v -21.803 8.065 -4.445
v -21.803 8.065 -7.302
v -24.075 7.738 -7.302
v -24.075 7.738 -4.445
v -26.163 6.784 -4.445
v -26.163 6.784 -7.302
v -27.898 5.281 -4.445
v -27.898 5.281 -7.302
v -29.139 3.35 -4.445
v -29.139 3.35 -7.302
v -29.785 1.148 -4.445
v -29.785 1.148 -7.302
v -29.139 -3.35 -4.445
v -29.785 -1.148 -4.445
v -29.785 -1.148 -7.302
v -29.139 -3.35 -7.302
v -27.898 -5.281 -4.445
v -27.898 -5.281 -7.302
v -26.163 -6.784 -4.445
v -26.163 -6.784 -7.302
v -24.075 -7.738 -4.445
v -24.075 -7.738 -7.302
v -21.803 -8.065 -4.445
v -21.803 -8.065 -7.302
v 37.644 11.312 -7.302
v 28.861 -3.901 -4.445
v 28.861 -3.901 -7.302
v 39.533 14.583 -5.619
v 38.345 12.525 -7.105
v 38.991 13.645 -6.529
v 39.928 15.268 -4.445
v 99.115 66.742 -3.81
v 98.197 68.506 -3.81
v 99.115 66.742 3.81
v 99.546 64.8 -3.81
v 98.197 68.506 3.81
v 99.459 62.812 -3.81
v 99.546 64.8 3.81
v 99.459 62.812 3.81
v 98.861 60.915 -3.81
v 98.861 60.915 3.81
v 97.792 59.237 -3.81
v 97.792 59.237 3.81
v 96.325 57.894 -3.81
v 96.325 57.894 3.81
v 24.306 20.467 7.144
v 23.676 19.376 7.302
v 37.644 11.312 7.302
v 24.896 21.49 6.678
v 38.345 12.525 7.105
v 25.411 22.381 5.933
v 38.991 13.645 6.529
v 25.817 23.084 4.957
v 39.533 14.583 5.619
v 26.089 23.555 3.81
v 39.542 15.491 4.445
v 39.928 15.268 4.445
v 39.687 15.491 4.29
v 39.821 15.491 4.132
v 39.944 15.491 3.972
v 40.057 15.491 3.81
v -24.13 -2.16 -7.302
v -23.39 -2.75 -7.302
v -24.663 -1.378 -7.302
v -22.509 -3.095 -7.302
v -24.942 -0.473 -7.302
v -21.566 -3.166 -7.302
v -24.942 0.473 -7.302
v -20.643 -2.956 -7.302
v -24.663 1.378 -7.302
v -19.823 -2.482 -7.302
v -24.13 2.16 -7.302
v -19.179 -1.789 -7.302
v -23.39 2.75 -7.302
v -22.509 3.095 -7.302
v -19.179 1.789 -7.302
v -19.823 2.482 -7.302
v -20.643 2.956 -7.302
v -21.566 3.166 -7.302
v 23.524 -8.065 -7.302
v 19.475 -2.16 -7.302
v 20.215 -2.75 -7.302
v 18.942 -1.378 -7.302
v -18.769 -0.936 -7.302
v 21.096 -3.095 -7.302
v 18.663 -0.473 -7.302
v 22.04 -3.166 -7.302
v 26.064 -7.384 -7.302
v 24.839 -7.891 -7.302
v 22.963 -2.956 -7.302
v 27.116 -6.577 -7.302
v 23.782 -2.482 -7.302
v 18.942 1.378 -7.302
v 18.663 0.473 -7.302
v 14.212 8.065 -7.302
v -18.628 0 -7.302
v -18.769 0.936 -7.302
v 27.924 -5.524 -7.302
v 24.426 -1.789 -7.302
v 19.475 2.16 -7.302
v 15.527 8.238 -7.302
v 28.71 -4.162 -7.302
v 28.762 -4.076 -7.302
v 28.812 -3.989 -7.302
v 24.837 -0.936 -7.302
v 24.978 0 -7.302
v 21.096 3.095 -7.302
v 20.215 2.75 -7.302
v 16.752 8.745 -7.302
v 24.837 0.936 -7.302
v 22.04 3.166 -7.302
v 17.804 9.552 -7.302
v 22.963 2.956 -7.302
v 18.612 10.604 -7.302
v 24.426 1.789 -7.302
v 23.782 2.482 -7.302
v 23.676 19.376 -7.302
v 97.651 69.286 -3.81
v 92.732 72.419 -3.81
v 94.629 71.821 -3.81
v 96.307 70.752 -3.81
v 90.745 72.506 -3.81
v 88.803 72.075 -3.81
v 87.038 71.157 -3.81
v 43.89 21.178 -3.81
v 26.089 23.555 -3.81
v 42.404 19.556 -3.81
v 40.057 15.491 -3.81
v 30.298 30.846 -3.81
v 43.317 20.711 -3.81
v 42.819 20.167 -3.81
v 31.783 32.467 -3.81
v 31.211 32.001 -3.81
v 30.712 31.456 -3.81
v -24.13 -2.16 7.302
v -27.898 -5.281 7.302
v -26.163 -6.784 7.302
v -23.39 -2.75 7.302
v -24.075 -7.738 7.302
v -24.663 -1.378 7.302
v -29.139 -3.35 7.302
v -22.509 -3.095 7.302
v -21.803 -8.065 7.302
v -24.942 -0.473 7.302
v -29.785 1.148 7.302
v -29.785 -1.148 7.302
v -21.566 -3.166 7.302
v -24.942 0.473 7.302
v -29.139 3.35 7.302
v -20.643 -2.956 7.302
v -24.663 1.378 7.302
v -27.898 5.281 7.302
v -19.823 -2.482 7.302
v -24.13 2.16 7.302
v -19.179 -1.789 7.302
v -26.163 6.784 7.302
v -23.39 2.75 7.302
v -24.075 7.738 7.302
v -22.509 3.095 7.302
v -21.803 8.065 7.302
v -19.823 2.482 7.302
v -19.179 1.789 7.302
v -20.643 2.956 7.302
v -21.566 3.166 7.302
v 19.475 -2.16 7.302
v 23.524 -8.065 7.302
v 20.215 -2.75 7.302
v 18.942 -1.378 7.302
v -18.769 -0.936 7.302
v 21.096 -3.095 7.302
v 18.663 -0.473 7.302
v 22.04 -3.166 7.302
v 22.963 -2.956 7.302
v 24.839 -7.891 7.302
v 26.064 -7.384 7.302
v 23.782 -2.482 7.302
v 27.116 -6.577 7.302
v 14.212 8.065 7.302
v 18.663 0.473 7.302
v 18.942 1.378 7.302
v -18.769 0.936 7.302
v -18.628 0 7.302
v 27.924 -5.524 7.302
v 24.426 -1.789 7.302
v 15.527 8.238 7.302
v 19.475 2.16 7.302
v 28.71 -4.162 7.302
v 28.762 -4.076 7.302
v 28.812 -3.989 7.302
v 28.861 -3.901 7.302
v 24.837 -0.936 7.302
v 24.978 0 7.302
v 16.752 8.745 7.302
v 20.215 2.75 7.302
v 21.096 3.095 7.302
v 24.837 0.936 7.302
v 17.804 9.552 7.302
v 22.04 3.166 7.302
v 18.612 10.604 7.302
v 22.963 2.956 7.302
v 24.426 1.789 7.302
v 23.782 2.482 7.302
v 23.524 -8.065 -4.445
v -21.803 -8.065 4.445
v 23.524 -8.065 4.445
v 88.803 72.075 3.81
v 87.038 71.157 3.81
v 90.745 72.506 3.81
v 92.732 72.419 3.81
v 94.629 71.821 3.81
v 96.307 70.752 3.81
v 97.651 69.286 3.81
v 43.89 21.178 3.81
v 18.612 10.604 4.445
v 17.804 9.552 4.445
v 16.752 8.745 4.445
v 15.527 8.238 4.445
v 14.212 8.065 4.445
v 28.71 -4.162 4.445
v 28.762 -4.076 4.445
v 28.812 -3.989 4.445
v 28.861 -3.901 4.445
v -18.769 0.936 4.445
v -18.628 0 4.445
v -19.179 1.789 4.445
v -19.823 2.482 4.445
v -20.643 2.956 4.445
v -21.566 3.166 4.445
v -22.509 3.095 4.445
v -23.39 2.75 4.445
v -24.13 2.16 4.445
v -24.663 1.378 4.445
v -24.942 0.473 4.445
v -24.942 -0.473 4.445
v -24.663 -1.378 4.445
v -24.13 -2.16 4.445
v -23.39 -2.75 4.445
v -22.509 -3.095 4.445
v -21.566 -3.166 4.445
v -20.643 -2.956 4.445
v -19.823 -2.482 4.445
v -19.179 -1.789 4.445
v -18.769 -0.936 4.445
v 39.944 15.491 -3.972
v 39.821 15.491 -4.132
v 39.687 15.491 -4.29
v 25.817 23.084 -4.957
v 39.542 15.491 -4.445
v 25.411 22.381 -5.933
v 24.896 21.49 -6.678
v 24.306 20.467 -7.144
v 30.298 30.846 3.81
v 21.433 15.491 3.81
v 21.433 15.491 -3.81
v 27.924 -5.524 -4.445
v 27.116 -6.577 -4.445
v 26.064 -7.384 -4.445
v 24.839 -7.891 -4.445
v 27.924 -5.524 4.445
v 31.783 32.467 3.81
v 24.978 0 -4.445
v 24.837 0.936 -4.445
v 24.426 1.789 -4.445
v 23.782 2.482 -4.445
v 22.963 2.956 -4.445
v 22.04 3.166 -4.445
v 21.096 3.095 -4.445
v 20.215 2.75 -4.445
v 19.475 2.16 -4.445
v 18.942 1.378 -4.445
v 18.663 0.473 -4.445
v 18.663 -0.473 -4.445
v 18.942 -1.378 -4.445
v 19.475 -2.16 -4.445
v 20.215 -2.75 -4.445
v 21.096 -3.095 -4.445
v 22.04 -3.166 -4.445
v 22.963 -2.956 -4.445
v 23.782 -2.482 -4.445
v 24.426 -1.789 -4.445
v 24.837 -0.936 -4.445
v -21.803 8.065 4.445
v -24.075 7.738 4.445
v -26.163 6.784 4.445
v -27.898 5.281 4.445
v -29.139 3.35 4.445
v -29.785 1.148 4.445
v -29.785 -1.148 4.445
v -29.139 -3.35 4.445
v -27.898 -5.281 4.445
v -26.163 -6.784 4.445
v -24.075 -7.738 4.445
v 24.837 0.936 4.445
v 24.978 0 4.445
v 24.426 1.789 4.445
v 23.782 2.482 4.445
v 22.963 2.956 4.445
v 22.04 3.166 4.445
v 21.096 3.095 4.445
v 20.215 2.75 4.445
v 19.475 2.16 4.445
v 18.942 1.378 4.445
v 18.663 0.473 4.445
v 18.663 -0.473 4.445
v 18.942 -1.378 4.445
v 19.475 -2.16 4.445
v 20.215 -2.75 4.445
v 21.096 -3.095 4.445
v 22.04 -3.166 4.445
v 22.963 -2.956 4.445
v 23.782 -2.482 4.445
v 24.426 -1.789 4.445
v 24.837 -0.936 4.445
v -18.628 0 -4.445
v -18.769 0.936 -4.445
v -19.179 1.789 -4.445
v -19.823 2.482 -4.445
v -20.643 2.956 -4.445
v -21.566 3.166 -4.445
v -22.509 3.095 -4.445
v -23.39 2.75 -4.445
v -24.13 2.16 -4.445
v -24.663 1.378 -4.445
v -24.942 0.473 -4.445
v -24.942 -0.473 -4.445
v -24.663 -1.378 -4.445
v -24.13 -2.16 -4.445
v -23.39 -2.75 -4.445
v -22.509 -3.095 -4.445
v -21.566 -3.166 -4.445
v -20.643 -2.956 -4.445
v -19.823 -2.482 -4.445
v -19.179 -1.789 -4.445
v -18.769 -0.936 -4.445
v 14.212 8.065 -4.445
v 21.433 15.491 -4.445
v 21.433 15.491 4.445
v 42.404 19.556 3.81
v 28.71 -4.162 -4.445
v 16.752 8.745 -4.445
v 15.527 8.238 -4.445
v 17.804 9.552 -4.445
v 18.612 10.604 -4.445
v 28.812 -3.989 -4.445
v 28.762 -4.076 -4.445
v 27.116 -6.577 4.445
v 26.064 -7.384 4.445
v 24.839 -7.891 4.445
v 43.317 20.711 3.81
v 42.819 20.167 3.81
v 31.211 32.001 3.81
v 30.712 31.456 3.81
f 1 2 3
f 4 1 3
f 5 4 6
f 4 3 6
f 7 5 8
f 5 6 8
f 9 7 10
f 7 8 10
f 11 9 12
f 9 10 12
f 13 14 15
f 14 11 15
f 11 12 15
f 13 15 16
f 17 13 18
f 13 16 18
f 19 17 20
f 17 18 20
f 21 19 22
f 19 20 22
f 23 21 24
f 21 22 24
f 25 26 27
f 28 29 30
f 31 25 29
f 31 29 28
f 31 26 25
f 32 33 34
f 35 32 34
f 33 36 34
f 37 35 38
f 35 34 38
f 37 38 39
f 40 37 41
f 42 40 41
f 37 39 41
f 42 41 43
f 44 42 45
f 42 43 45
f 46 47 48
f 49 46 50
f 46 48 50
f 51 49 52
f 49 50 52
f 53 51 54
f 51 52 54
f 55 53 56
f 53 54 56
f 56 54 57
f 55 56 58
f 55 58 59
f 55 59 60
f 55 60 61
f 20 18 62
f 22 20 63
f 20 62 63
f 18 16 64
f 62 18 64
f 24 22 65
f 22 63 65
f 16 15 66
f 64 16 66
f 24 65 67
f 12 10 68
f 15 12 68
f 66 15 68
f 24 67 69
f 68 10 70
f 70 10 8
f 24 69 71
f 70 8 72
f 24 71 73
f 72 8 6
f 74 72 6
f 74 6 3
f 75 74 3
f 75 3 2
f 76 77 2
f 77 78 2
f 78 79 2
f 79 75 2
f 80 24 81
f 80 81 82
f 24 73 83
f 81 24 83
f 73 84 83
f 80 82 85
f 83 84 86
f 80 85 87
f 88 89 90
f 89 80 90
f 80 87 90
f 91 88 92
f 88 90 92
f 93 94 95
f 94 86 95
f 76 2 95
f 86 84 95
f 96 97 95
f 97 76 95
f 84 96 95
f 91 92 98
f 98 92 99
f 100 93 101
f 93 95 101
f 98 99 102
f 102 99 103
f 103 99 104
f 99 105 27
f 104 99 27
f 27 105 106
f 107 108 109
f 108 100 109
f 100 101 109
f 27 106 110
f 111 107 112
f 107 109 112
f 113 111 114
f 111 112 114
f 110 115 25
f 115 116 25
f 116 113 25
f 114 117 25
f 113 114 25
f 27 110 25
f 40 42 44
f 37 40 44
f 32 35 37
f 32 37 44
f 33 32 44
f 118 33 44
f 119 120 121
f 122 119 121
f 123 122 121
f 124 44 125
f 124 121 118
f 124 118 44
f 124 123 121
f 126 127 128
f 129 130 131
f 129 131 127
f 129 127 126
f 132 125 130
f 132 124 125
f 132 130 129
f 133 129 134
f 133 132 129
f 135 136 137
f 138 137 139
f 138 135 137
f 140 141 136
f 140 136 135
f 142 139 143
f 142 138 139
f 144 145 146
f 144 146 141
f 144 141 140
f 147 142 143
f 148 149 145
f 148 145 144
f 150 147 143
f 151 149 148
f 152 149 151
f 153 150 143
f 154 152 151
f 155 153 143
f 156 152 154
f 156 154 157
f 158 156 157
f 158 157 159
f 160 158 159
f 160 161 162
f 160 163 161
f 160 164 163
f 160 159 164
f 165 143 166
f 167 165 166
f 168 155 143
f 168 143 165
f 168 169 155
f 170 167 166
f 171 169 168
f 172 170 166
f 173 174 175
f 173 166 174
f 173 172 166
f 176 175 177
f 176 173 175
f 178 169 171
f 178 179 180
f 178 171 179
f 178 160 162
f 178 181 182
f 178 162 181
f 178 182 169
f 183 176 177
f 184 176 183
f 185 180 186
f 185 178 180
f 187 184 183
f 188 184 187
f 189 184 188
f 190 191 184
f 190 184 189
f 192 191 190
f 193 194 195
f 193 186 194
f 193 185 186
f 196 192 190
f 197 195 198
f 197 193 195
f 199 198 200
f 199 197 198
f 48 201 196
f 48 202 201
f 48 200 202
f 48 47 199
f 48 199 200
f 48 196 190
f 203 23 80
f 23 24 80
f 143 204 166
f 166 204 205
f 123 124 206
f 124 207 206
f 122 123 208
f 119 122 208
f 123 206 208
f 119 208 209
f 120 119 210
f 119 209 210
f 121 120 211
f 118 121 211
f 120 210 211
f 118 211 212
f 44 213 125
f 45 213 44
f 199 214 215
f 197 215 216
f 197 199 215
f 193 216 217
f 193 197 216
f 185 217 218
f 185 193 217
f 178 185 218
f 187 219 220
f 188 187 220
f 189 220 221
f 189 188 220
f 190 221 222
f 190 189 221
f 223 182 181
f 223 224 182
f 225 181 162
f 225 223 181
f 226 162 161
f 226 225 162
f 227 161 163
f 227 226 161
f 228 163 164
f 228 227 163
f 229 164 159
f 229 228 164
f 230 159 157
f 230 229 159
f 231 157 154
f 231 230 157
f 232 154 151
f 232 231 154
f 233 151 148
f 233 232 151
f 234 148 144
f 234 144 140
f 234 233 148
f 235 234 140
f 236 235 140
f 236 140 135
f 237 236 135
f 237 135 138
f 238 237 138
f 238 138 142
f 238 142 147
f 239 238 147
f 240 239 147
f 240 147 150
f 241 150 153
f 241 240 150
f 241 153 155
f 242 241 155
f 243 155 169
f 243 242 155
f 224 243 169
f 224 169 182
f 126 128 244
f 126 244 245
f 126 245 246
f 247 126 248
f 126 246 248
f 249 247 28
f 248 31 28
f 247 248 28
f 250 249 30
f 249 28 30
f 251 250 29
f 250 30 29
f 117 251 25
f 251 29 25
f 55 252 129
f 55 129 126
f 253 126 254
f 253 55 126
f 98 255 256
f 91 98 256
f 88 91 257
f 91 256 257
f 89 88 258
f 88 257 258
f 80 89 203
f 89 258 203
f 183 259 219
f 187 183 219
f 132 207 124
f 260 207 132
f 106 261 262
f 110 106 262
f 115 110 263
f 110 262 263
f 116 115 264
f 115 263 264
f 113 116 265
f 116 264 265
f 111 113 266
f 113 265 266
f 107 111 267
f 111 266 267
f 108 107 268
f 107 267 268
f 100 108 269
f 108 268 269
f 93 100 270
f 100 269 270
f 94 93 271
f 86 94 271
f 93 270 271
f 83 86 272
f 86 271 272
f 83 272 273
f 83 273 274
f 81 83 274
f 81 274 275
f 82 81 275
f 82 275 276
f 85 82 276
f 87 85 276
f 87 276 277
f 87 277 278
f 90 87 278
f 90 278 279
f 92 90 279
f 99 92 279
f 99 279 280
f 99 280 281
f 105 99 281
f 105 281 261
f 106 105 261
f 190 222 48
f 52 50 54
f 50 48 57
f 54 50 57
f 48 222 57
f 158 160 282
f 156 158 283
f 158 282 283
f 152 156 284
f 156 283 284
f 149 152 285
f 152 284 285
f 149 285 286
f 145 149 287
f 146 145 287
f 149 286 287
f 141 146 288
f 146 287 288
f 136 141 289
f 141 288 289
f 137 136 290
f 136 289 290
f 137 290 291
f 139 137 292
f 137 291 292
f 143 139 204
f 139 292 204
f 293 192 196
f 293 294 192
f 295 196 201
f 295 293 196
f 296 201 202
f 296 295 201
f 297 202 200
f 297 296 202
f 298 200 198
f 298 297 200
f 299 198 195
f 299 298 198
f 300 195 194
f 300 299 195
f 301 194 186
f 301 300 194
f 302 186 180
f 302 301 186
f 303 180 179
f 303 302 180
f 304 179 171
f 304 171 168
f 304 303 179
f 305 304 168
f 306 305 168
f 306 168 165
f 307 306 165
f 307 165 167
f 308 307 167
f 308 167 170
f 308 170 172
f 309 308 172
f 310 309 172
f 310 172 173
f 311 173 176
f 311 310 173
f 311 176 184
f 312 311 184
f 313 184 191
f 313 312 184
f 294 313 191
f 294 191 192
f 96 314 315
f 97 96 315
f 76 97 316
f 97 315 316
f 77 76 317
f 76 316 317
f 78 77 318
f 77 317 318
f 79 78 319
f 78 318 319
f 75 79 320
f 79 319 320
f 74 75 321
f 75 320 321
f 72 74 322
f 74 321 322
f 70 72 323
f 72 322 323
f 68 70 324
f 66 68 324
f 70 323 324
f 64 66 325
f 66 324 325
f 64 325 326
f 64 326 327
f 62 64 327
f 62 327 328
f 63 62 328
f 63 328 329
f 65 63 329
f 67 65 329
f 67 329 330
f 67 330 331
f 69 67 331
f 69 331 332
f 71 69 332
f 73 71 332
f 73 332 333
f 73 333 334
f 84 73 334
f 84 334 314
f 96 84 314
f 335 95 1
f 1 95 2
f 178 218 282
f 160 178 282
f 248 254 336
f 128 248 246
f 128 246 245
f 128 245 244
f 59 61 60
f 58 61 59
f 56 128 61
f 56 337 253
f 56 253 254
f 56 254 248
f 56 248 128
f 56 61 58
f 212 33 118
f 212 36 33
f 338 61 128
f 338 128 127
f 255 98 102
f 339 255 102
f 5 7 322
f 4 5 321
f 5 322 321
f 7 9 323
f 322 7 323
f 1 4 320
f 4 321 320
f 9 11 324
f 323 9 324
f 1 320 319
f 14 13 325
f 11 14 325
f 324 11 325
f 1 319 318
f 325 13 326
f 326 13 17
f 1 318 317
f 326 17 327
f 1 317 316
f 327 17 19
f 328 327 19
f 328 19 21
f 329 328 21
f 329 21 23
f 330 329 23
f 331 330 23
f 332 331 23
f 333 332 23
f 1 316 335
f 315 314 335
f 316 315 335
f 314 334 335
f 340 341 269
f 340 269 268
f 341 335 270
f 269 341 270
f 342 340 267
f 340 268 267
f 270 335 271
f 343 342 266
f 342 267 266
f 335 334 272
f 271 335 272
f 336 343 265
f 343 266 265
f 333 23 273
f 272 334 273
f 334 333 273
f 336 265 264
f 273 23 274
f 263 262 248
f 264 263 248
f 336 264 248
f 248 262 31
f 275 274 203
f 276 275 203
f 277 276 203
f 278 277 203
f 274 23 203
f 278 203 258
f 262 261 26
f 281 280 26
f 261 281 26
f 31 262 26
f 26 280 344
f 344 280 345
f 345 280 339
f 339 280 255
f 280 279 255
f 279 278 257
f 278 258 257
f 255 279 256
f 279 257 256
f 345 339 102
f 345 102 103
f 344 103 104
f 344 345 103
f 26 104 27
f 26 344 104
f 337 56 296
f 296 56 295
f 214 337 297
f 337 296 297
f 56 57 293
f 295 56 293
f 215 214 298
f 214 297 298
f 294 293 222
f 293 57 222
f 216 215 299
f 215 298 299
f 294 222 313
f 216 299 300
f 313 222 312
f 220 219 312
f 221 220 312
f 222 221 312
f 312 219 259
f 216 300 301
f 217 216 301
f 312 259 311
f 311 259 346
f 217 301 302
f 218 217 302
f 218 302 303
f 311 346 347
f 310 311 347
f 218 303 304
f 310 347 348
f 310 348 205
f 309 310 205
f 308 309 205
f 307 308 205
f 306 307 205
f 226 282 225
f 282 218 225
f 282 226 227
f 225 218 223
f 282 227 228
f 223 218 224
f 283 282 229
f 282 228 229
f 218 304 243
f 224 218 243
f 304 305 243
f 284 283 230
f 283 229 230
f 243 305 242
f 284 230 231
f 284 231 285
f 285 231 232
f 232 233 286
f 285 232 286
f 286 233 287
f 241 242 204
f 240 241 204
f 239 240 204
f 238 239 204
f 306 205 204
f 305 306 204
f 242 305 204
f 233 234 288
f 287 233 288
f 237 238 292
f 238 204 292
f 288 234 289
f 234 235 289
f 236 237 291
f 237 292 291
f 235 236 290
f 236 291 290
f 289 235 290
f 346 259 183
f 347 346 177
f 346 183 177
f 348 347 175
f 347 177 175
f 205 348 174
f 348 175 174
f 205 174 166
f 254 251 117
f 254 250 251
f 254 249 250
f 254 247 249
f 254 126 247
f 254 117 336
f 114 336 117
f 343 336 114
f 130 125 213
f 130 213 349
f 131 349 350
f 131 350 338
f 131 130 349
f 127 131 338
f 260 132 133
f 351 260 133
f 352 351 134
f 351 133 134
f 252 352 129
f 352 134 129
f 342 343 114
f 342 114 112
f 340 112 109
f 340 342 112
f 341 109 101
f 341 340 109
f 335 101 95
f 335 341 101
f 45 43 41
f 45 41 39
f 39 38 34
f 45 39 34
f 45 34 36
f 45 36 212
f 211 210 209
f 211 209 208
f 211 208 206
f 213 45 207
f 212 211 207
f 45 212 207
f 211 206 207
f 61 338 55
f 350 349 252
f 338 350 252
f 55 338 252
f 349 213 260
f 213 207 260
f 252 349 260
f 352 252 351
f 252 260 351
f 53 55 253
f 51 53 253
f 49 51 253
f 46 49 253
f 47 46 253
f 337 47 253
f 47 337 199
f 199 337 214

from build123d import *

# Parameters (mm, degrees)
F0_R          = 3.175
F1_DEPTH      = 3.81
F1_DEPTH_BACK = 3.81
F2_R          = 3.175
F3_DEPTH      = 3.4925
F3_DEPTH_BACK = 11.1125
F5_R          = 5.08
F6_R          = 7.62
F8_DEPTH      = 7.3025
F8_DEPTH_BACK = 7.3025
F4_W          = 35.6460946558
F4_H          = 8.89
F4_W_2        = 48.26
F4_W_3        = 30.9916705634
F9_DEPTH      = 23.5553863263
F10_T1_DEPTH  = 7.62
F10_T3_DEPTH  = 40.2569110938
F10_T5_DEPTH  = 13.2510444311
F10_T7_DEPTH  = 40.2569110938


# Not quite as in the source:
# - a fillet or chamfer that OpenCascade refuses, or shapes differently, is made with other operations: its cross-section is extruded or revolved along the edge and cut away or added


with BuildPart() as f1:
    # F0 (on Top) → F1 (new body, two sides)
    with BuildSketch(Plane.XY) as f1_sk:
        with BuildLine():
            Line((17.1451295545, 8.0645), (21.8027879538, 8.0645))
            ThreePointArc((21.8027879538, 8.0645), (28.7489728397, 4.0971545957), (28.860781215, -3.9013960801))
            Line((28.860781215, -3.9013960801), (42.9672120462, 20.531658833))
            Line((42.9672120462, 20.531658833), (102.5673909916, 62.2641534092))
            Line((102.5673909916, 62.2641534092), (93.2803106107, 75.5274787436))
            Line((93.2803106107, 75.5274787436), (30.8609248359, 31.8209542937))
            Line((30.8609248359, 31.8209542937), (17.1451295545, 8.0645))
        make_face()
        with BuildLine():
            ThreePointArc((28.7104927, -4.1617034239), (28.7868498226, -4.03225), (28.860781215, -3.9013960801))
            Line((28.860781215, -3.9013960801), (28.7104927, -4.1617034239))
        make_face()
        with BuildLine():
            ThreePointArc((28.860781215, -3.9013960801), (28.7489728397, 4.0971545957), (21.8027879538, 8.0645))
            Line((21.8027879538, 8.0645), (17.1451295545, 8.0645))
            Line((17.1451295545, 8.0645), (-21.8027879538, 8.0645))
            ThreePointArc((-21.8027879538, 8.0645), (-29.8672879538, 0), (-21.8027879538, -8.0645))
            Line((-21.8027879538, -8.0645), (21.8027879538, -8.0645))
            Line((21.8027879538, -8.0645), (26.4572120462, -8.0645))
            Line((26.4572120462, -8.0645), (28.7104927, -4.1617034239))
            Line((28.7104927, -4.1617034239), (28.860781215, -3.9013960801))
        make_face()
        with Locations((-21.8027879538, 0)):
            Circle(F0_R, mode=Mode.SUBTRACT)
        with Locations((21.8027879538, 0)):
            Circle(F0_R, mode=Mode.SUBTRACT)
    extrude(amount=F1_DEPTH)
    extrude(f1_sk.sketch, amount=-F1_DEPTH_BACK)

    # F2 (on face) → F3 (join, two sides)
    with BuildSketch(Plane.XY.offset(3.81)) as f3_sk:
        with BuildLine():
            Line((17.1451295545, 8.0645), (-21.8027879538, 8.0645))
            ThreePointArc((-21.8027879538, 8.0645), (-29.8672879538, 0), (-21.8027879538, -8.0645))
            Line((-21.8027879538, -8.0645), (26.4572120462, -8.0645))
            Line((26.4572120462, -8.0645), (28.7104927, -4.1617034239))
            ThreePointArc((28.7104927, -4.1617034239), (28.7868498226, -4.03225), (28.860781215, -3.9013960801))
            ThreePointArc((28.860781215, -3.9013960801), (28.7489728397, 4.0971545957), (21.8027879538, 8.0645))
            Line((21.8027879538, 8.0645), (17.1451295545, 8.0645))
        make_face()
        with Locations((-21.8027879538, 0)):
            Circle(F2_R, mode=Mode.SUBTRACT)
        with Locations((21.8027879538, 0)):
            Circle(F2_R, mode=Mode.SUBTRACT)
    extrude(amount=F3_DEPTH)
    extrude(f3_sk.sketch, amount=-F3_DEPTH_BACK)

    # F5
    f5_edges = [f1.edges().sort_by_distance(p)[0] for p in [
        (26.457212, -8.0645, 0),
        (17.14513, 8.0645, 0),
    ]]
    fillet(f5_edges, radius=F5_R)

    # F6
    f6_edges = [f1.edges().sort_by_distance(p)[0] for p in [
        (93.280311, 75.527479, 0),
        (102.567391, 62.264153, 0),
    ]]
    fillet(f6_edges, radius=F6_R)

    # F7 (on Top) → F8 (join, two sides)
    with BuildSketch(Plane.XY) as f8_sk:
        with BuildLine():
            Line((26.088796945, 23.5553863263), (18.6115992382, 10.6045))
            ThreePointArc((18.6115992382, 10.6045), (16.752190187, 8.7450909488), (14.212190187, 8.0645))
            Line((14.212190187, 8.0645), (21.8027879538, 8.0645))
            ThreePointArc((21.8027879538, 8.0645), (28.7489728397, 4.0971545957), (28.860781215, -3.9013960801))
            Line((28.860781215, -3.9013960801), (40.0569206826, 15.4908863263))
            Line((40.0569206826, 15.4908863263), (26.088796945, 23.5553863263))
        make_face()
    extrude(amount=F8_DEPTH)
    extrude(f8_sk.sketch, amount=-F8_DEPTH_BACK)

    # F4 (on face) → F9 (cut, through all)
    with BuildSketch(Plane.XZ.offset(8.0645)):
        with Locations((-39.6258352817, 0)):
            Rectangle(F4_W, F4_H)
        with Locations((2.3272120462, 0)):
            Rectangle(F4_W_2, F4_H)
        with Locations((41.9530473279, 0)):
            Rectangle(F4_W_3, F4_H)
    extrude(amount=-F9_DEPTH, mode=Mode.SUBTRACT)

    # F10: fillet of radius 5.08 on 4 edges, made by hand

    # F10_s2 → F10_t1 (join)
    with BuildSketch(Plane.XY.offset(-3.81)):
        with BuildLine():
            ThreePointArc((43.8897483577, 21.1776257125), (43.0581477833, 20.4483315822), (42.4041076031, 19.5563333275))
            Line((42.4041076031, 19.5563333275), (42.9672120462, 20.531658833))
            Line((42.9672120462, 20.531658833), (43.8897483577, 21.1776257125))
        make_face()
    extrude(amount=F10_T1_DEPTH)

    # F10_s4 → F10_t3 (cut)
    with BuildSketch(Plane(origin=(33.7826319428, -19.5044116461, 0), x_dir=(0, 0, 1), z_dir=(-0.8660254038, 0.5, 0))):
        with BuildLine():
            ThreePointArc((-3.81, 33.4439614271), (-6.3377703435, 31.5967932158), (-7.3025, 28.6183792083))
            Line((-7.3025, 28.6183792083), (-7.3025, 33.4439614271))
            Line((-7.3025, 33.4439614271), (-3.81, 33.4439614271))
        make_face()
    extrude(amount=F10_T3_DEPTH, mode=Mode.SUBTRACT)

    # F10_s6 → F10_t5 (cut)
    with BuildSketch(Plane.XY.offset(-6.6255222156)):
        with BuildLine():
            ThreePointArc((31.7834611474, 32.4669211732), (30.951860573, 31.7376270429), (30.2978203928, 30.8456287882))
            Line((30.2978203928, 30.8456287882), (30.8609248359, 31.8209542937))
            Line((30.8609248359, 31.8209542937), (31.7834611474, 32.4669211732))
        make_face()
    extrude(amount=F10_T5_DEPTH, mode=Mode.SUBTRACT)

    # F10_s8 → F10_t7 (cut)
    with BuildSketch(Plane(origin=(33.7826319428, -19.5044116461, 0), x_dir=(0, 0, 1), z_dir=(-0.8660254038, 0.5, 0))):
        with BuildLine():
            ThreePointArc((7.3025, 28.6183792083), (6.3377703435, 31.5967932158), (3.81, 33.4439614271))
            Line((3.81, 33.4439614271), (7.3025, 33.4439614271))
            Line((7.3025, 33.4439614271), (7.3025, 28.6183792083))
        make_face()
    extrude(amount=F10_T7_DEPTH, mode=Mode.SUBTRACT)


solid = f1.part
